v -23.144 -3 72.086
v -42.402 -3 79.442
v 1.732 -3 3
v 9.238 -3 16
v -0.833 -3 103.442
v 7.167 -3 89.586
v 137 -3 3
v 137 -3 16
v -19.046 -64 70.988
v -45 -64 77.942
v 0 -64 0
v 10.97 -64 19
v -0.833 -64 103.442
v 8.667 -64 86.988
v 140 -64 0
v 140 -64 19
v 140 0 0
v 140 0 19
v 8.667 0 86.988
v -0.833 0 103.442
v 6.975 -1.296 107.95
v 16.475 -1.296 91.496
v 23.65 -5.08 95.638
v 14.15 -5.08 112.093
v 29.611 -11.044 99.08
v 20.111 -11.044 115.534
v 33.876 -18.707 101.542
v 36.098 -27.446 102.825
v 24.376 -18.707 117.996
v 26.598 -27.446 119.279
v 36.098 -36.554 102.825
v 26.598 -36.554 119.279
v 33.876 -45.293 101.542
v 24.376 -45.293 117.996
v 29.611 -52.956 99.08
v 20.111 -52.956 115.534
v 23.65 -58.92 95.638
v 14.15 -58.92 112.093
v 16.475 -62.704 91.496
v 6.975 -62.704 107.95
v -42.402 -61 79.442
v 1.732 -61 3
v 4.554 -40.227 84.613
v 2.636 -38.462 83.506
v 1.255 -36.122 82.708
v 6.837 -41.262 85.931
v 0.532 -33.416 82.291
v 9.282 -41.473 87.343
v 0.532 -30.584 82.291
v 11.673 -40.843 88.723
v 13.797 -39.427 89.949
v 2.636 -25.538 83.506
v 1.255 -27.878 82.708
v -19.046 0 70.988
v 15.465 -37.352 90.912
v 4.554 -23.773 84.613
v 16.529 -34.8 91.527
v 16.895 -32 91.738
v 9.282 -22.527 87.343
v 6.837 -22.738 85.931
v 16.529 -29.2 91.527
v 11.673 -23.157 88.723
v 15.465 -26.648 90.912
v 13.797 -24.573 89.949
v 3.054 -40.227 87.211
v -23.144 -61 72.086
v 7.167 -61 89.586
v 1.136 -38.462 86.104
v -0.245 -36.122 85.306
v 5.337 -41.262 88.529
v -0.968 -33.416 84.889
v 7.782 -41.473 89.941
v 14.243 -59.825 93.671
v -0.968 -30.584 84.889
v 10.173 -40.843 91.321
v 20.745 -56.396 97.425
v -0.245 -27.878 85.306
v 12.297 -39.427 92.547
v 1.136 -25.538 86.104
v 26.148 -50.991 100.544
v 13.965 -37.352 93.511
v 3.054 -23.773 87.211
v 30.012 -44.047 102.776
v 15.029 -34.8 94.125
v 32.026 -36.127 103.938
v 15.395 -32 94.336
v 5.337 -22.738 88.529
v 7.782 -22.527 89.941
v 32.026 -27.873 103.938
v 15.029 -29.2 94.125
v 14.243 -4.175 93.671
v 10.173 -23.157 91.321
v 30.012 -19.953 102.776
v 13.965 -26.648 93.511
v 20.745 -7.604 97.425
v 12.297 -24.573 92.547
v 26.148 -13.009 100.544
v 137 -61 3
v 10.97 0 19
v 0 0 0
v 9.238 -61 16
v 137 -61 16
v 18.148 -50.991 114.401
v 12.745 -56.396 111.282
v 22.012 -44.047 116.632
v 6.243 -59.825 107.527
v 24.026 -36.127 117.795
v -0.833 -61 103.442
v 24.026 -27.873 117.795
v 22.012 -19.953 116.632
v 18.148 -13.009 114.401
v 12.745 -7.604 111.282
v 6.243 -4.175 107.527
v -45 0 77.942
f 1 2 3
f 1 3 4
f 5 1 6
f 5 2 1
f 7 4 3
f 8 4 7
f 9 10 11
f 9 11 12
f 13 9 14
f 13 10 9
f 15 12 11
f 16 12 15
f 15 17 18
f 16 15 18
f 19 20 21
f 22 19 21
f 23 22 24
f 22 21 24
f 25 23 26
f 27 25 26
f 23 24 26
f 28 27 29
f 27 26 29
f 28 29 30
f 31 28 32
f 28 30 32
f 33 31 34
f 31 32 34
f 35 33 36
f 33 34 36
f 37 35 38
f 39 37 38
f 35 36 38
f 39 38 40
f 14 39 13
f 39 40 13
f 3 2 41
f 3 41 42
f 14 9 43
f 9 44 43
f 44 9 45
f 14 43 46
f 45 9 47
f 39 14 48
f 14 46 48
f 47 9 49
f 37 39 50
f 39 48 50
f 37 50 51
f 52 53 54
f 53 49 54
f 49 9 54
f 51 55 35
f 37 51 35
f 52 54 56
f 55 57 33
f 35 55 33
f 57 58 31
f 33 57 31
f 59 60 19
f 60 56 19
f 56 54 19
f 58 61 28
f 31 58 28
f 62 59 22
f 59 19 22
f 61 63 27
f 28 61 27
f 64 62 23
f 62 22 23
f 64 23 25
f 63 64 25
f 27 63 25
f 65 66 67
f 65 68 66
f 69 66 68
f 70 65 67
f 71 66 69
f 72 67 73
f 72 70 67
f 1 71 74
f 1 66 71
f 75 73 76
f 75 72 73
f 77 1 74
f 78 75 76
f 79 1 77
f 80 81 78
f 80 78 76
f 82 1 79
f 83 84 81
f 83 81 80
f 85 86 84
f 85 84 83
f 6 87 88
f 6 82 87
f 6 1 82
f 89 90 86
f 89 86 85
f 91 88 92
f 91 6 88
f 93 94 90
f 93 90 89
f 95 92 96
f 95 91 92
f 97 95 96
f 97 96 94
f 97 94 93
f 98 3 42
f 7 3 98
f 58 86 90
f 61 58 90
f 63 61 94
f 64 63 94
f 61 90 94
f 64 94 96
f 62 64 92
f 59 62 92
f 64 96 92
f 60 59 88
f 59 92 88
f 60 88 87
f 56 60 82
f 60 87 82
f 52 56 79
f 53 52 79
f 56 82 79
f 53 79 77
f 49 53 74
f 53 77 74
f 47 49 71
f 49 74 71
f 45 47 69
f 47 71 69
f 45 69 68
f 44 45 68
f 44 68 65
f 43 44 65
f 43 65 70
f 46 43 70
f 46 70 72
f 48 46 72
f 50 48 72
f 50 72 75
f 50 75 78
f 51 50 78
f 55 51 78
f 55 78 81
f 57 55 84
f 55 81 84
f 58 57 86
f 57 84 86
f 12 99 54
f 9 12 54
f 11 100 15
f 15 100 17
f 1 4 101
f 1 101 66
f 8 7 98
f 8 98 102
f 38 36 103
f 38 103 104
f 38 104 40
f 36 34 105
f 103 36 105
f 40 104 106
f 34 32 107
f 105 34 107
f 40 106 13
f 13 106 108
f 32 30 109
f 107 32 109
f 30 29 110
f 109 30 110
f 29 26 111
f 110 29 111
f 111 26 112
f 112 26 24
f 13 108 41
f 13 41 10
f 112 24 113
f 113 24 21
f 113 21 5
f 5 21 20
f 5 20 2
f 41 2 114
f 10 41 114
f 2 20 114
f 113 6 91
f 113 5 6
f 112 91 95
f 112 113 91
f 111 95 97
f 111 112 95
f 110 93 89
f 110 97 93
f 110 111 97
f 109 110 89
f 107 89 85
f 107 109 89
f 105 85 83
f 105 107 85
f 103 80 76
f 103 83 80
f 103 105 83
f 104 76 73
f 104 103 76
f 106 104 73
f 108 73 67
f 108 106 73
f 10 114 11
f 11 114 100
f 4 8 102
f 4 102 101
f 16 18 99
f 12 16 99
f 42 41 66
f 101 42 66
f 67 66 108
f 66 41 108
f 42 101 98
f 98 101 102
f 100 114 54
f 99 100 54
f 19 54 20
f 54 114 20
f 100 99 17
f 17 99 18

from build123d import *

# Parameters (mm, degrees)
F2_DEPTH = 64
F4_DEPTH = 19
F5_T     = -3
F6_R     = 9.5
F7_DEPTH = 3


with BuildPart() as f2:
    # F1 (on Front) → F2 (new body)
    with BuildSketch(Plane.XZ):
        Polygon((0, 0), (140, 0), (140, 19), (10.9696551146, 19), (-19.0455173281, 70.9878036687), (64.0929214352, 118.9878036687), (54.5929214352, 135.4422863406), (-45, 77.9422863406), align=None)
    extrude(amount=F2_DEPTH)

    # F3 (on face) → F4 (cut, through all)
    with BuildSketch(Plane(origin=(-45, 0, 77.9422863406), x_dir=(0.8660254038, 0, 0.5), z_dir=(-0.5, 0, 0.8660254038))):
        with BuildLine():
            ThreePointArc((51, 0), (83, -32), (51, -64))
            Line((51, -64), (115, -64))
            Line((115, -64), (115, 0))
            Line((115, 0), (51, 0))
        make_face()
    extrude(amount=-F4_DEPTH, mode=Mode.SUBTRACT)

    # F5
    f5_openings = [f2.faces().sort_by_distance(p)[0] for p in [
        (-11.74342, -32, 97.142982),
    ]]
    offset(amount=F5_T, openings=f5_openings, kind=Kind.INTERSECTION)

    # F6 (on face) → F7 (cut, through all)
    with BuildSketch(Plane(origin=(-37, 0, 64.08587988), x_dir=(0.8660254038, 0, 0.5), z_dir=(-0.5, 0, 0.8660254038))):
        with Locations((51.0000000002, -32)):
            Circle(F6_R)
    extrude(amount=-F7_DEPTH, mode=Mode.SUBTRACT)


solid = f2.part
